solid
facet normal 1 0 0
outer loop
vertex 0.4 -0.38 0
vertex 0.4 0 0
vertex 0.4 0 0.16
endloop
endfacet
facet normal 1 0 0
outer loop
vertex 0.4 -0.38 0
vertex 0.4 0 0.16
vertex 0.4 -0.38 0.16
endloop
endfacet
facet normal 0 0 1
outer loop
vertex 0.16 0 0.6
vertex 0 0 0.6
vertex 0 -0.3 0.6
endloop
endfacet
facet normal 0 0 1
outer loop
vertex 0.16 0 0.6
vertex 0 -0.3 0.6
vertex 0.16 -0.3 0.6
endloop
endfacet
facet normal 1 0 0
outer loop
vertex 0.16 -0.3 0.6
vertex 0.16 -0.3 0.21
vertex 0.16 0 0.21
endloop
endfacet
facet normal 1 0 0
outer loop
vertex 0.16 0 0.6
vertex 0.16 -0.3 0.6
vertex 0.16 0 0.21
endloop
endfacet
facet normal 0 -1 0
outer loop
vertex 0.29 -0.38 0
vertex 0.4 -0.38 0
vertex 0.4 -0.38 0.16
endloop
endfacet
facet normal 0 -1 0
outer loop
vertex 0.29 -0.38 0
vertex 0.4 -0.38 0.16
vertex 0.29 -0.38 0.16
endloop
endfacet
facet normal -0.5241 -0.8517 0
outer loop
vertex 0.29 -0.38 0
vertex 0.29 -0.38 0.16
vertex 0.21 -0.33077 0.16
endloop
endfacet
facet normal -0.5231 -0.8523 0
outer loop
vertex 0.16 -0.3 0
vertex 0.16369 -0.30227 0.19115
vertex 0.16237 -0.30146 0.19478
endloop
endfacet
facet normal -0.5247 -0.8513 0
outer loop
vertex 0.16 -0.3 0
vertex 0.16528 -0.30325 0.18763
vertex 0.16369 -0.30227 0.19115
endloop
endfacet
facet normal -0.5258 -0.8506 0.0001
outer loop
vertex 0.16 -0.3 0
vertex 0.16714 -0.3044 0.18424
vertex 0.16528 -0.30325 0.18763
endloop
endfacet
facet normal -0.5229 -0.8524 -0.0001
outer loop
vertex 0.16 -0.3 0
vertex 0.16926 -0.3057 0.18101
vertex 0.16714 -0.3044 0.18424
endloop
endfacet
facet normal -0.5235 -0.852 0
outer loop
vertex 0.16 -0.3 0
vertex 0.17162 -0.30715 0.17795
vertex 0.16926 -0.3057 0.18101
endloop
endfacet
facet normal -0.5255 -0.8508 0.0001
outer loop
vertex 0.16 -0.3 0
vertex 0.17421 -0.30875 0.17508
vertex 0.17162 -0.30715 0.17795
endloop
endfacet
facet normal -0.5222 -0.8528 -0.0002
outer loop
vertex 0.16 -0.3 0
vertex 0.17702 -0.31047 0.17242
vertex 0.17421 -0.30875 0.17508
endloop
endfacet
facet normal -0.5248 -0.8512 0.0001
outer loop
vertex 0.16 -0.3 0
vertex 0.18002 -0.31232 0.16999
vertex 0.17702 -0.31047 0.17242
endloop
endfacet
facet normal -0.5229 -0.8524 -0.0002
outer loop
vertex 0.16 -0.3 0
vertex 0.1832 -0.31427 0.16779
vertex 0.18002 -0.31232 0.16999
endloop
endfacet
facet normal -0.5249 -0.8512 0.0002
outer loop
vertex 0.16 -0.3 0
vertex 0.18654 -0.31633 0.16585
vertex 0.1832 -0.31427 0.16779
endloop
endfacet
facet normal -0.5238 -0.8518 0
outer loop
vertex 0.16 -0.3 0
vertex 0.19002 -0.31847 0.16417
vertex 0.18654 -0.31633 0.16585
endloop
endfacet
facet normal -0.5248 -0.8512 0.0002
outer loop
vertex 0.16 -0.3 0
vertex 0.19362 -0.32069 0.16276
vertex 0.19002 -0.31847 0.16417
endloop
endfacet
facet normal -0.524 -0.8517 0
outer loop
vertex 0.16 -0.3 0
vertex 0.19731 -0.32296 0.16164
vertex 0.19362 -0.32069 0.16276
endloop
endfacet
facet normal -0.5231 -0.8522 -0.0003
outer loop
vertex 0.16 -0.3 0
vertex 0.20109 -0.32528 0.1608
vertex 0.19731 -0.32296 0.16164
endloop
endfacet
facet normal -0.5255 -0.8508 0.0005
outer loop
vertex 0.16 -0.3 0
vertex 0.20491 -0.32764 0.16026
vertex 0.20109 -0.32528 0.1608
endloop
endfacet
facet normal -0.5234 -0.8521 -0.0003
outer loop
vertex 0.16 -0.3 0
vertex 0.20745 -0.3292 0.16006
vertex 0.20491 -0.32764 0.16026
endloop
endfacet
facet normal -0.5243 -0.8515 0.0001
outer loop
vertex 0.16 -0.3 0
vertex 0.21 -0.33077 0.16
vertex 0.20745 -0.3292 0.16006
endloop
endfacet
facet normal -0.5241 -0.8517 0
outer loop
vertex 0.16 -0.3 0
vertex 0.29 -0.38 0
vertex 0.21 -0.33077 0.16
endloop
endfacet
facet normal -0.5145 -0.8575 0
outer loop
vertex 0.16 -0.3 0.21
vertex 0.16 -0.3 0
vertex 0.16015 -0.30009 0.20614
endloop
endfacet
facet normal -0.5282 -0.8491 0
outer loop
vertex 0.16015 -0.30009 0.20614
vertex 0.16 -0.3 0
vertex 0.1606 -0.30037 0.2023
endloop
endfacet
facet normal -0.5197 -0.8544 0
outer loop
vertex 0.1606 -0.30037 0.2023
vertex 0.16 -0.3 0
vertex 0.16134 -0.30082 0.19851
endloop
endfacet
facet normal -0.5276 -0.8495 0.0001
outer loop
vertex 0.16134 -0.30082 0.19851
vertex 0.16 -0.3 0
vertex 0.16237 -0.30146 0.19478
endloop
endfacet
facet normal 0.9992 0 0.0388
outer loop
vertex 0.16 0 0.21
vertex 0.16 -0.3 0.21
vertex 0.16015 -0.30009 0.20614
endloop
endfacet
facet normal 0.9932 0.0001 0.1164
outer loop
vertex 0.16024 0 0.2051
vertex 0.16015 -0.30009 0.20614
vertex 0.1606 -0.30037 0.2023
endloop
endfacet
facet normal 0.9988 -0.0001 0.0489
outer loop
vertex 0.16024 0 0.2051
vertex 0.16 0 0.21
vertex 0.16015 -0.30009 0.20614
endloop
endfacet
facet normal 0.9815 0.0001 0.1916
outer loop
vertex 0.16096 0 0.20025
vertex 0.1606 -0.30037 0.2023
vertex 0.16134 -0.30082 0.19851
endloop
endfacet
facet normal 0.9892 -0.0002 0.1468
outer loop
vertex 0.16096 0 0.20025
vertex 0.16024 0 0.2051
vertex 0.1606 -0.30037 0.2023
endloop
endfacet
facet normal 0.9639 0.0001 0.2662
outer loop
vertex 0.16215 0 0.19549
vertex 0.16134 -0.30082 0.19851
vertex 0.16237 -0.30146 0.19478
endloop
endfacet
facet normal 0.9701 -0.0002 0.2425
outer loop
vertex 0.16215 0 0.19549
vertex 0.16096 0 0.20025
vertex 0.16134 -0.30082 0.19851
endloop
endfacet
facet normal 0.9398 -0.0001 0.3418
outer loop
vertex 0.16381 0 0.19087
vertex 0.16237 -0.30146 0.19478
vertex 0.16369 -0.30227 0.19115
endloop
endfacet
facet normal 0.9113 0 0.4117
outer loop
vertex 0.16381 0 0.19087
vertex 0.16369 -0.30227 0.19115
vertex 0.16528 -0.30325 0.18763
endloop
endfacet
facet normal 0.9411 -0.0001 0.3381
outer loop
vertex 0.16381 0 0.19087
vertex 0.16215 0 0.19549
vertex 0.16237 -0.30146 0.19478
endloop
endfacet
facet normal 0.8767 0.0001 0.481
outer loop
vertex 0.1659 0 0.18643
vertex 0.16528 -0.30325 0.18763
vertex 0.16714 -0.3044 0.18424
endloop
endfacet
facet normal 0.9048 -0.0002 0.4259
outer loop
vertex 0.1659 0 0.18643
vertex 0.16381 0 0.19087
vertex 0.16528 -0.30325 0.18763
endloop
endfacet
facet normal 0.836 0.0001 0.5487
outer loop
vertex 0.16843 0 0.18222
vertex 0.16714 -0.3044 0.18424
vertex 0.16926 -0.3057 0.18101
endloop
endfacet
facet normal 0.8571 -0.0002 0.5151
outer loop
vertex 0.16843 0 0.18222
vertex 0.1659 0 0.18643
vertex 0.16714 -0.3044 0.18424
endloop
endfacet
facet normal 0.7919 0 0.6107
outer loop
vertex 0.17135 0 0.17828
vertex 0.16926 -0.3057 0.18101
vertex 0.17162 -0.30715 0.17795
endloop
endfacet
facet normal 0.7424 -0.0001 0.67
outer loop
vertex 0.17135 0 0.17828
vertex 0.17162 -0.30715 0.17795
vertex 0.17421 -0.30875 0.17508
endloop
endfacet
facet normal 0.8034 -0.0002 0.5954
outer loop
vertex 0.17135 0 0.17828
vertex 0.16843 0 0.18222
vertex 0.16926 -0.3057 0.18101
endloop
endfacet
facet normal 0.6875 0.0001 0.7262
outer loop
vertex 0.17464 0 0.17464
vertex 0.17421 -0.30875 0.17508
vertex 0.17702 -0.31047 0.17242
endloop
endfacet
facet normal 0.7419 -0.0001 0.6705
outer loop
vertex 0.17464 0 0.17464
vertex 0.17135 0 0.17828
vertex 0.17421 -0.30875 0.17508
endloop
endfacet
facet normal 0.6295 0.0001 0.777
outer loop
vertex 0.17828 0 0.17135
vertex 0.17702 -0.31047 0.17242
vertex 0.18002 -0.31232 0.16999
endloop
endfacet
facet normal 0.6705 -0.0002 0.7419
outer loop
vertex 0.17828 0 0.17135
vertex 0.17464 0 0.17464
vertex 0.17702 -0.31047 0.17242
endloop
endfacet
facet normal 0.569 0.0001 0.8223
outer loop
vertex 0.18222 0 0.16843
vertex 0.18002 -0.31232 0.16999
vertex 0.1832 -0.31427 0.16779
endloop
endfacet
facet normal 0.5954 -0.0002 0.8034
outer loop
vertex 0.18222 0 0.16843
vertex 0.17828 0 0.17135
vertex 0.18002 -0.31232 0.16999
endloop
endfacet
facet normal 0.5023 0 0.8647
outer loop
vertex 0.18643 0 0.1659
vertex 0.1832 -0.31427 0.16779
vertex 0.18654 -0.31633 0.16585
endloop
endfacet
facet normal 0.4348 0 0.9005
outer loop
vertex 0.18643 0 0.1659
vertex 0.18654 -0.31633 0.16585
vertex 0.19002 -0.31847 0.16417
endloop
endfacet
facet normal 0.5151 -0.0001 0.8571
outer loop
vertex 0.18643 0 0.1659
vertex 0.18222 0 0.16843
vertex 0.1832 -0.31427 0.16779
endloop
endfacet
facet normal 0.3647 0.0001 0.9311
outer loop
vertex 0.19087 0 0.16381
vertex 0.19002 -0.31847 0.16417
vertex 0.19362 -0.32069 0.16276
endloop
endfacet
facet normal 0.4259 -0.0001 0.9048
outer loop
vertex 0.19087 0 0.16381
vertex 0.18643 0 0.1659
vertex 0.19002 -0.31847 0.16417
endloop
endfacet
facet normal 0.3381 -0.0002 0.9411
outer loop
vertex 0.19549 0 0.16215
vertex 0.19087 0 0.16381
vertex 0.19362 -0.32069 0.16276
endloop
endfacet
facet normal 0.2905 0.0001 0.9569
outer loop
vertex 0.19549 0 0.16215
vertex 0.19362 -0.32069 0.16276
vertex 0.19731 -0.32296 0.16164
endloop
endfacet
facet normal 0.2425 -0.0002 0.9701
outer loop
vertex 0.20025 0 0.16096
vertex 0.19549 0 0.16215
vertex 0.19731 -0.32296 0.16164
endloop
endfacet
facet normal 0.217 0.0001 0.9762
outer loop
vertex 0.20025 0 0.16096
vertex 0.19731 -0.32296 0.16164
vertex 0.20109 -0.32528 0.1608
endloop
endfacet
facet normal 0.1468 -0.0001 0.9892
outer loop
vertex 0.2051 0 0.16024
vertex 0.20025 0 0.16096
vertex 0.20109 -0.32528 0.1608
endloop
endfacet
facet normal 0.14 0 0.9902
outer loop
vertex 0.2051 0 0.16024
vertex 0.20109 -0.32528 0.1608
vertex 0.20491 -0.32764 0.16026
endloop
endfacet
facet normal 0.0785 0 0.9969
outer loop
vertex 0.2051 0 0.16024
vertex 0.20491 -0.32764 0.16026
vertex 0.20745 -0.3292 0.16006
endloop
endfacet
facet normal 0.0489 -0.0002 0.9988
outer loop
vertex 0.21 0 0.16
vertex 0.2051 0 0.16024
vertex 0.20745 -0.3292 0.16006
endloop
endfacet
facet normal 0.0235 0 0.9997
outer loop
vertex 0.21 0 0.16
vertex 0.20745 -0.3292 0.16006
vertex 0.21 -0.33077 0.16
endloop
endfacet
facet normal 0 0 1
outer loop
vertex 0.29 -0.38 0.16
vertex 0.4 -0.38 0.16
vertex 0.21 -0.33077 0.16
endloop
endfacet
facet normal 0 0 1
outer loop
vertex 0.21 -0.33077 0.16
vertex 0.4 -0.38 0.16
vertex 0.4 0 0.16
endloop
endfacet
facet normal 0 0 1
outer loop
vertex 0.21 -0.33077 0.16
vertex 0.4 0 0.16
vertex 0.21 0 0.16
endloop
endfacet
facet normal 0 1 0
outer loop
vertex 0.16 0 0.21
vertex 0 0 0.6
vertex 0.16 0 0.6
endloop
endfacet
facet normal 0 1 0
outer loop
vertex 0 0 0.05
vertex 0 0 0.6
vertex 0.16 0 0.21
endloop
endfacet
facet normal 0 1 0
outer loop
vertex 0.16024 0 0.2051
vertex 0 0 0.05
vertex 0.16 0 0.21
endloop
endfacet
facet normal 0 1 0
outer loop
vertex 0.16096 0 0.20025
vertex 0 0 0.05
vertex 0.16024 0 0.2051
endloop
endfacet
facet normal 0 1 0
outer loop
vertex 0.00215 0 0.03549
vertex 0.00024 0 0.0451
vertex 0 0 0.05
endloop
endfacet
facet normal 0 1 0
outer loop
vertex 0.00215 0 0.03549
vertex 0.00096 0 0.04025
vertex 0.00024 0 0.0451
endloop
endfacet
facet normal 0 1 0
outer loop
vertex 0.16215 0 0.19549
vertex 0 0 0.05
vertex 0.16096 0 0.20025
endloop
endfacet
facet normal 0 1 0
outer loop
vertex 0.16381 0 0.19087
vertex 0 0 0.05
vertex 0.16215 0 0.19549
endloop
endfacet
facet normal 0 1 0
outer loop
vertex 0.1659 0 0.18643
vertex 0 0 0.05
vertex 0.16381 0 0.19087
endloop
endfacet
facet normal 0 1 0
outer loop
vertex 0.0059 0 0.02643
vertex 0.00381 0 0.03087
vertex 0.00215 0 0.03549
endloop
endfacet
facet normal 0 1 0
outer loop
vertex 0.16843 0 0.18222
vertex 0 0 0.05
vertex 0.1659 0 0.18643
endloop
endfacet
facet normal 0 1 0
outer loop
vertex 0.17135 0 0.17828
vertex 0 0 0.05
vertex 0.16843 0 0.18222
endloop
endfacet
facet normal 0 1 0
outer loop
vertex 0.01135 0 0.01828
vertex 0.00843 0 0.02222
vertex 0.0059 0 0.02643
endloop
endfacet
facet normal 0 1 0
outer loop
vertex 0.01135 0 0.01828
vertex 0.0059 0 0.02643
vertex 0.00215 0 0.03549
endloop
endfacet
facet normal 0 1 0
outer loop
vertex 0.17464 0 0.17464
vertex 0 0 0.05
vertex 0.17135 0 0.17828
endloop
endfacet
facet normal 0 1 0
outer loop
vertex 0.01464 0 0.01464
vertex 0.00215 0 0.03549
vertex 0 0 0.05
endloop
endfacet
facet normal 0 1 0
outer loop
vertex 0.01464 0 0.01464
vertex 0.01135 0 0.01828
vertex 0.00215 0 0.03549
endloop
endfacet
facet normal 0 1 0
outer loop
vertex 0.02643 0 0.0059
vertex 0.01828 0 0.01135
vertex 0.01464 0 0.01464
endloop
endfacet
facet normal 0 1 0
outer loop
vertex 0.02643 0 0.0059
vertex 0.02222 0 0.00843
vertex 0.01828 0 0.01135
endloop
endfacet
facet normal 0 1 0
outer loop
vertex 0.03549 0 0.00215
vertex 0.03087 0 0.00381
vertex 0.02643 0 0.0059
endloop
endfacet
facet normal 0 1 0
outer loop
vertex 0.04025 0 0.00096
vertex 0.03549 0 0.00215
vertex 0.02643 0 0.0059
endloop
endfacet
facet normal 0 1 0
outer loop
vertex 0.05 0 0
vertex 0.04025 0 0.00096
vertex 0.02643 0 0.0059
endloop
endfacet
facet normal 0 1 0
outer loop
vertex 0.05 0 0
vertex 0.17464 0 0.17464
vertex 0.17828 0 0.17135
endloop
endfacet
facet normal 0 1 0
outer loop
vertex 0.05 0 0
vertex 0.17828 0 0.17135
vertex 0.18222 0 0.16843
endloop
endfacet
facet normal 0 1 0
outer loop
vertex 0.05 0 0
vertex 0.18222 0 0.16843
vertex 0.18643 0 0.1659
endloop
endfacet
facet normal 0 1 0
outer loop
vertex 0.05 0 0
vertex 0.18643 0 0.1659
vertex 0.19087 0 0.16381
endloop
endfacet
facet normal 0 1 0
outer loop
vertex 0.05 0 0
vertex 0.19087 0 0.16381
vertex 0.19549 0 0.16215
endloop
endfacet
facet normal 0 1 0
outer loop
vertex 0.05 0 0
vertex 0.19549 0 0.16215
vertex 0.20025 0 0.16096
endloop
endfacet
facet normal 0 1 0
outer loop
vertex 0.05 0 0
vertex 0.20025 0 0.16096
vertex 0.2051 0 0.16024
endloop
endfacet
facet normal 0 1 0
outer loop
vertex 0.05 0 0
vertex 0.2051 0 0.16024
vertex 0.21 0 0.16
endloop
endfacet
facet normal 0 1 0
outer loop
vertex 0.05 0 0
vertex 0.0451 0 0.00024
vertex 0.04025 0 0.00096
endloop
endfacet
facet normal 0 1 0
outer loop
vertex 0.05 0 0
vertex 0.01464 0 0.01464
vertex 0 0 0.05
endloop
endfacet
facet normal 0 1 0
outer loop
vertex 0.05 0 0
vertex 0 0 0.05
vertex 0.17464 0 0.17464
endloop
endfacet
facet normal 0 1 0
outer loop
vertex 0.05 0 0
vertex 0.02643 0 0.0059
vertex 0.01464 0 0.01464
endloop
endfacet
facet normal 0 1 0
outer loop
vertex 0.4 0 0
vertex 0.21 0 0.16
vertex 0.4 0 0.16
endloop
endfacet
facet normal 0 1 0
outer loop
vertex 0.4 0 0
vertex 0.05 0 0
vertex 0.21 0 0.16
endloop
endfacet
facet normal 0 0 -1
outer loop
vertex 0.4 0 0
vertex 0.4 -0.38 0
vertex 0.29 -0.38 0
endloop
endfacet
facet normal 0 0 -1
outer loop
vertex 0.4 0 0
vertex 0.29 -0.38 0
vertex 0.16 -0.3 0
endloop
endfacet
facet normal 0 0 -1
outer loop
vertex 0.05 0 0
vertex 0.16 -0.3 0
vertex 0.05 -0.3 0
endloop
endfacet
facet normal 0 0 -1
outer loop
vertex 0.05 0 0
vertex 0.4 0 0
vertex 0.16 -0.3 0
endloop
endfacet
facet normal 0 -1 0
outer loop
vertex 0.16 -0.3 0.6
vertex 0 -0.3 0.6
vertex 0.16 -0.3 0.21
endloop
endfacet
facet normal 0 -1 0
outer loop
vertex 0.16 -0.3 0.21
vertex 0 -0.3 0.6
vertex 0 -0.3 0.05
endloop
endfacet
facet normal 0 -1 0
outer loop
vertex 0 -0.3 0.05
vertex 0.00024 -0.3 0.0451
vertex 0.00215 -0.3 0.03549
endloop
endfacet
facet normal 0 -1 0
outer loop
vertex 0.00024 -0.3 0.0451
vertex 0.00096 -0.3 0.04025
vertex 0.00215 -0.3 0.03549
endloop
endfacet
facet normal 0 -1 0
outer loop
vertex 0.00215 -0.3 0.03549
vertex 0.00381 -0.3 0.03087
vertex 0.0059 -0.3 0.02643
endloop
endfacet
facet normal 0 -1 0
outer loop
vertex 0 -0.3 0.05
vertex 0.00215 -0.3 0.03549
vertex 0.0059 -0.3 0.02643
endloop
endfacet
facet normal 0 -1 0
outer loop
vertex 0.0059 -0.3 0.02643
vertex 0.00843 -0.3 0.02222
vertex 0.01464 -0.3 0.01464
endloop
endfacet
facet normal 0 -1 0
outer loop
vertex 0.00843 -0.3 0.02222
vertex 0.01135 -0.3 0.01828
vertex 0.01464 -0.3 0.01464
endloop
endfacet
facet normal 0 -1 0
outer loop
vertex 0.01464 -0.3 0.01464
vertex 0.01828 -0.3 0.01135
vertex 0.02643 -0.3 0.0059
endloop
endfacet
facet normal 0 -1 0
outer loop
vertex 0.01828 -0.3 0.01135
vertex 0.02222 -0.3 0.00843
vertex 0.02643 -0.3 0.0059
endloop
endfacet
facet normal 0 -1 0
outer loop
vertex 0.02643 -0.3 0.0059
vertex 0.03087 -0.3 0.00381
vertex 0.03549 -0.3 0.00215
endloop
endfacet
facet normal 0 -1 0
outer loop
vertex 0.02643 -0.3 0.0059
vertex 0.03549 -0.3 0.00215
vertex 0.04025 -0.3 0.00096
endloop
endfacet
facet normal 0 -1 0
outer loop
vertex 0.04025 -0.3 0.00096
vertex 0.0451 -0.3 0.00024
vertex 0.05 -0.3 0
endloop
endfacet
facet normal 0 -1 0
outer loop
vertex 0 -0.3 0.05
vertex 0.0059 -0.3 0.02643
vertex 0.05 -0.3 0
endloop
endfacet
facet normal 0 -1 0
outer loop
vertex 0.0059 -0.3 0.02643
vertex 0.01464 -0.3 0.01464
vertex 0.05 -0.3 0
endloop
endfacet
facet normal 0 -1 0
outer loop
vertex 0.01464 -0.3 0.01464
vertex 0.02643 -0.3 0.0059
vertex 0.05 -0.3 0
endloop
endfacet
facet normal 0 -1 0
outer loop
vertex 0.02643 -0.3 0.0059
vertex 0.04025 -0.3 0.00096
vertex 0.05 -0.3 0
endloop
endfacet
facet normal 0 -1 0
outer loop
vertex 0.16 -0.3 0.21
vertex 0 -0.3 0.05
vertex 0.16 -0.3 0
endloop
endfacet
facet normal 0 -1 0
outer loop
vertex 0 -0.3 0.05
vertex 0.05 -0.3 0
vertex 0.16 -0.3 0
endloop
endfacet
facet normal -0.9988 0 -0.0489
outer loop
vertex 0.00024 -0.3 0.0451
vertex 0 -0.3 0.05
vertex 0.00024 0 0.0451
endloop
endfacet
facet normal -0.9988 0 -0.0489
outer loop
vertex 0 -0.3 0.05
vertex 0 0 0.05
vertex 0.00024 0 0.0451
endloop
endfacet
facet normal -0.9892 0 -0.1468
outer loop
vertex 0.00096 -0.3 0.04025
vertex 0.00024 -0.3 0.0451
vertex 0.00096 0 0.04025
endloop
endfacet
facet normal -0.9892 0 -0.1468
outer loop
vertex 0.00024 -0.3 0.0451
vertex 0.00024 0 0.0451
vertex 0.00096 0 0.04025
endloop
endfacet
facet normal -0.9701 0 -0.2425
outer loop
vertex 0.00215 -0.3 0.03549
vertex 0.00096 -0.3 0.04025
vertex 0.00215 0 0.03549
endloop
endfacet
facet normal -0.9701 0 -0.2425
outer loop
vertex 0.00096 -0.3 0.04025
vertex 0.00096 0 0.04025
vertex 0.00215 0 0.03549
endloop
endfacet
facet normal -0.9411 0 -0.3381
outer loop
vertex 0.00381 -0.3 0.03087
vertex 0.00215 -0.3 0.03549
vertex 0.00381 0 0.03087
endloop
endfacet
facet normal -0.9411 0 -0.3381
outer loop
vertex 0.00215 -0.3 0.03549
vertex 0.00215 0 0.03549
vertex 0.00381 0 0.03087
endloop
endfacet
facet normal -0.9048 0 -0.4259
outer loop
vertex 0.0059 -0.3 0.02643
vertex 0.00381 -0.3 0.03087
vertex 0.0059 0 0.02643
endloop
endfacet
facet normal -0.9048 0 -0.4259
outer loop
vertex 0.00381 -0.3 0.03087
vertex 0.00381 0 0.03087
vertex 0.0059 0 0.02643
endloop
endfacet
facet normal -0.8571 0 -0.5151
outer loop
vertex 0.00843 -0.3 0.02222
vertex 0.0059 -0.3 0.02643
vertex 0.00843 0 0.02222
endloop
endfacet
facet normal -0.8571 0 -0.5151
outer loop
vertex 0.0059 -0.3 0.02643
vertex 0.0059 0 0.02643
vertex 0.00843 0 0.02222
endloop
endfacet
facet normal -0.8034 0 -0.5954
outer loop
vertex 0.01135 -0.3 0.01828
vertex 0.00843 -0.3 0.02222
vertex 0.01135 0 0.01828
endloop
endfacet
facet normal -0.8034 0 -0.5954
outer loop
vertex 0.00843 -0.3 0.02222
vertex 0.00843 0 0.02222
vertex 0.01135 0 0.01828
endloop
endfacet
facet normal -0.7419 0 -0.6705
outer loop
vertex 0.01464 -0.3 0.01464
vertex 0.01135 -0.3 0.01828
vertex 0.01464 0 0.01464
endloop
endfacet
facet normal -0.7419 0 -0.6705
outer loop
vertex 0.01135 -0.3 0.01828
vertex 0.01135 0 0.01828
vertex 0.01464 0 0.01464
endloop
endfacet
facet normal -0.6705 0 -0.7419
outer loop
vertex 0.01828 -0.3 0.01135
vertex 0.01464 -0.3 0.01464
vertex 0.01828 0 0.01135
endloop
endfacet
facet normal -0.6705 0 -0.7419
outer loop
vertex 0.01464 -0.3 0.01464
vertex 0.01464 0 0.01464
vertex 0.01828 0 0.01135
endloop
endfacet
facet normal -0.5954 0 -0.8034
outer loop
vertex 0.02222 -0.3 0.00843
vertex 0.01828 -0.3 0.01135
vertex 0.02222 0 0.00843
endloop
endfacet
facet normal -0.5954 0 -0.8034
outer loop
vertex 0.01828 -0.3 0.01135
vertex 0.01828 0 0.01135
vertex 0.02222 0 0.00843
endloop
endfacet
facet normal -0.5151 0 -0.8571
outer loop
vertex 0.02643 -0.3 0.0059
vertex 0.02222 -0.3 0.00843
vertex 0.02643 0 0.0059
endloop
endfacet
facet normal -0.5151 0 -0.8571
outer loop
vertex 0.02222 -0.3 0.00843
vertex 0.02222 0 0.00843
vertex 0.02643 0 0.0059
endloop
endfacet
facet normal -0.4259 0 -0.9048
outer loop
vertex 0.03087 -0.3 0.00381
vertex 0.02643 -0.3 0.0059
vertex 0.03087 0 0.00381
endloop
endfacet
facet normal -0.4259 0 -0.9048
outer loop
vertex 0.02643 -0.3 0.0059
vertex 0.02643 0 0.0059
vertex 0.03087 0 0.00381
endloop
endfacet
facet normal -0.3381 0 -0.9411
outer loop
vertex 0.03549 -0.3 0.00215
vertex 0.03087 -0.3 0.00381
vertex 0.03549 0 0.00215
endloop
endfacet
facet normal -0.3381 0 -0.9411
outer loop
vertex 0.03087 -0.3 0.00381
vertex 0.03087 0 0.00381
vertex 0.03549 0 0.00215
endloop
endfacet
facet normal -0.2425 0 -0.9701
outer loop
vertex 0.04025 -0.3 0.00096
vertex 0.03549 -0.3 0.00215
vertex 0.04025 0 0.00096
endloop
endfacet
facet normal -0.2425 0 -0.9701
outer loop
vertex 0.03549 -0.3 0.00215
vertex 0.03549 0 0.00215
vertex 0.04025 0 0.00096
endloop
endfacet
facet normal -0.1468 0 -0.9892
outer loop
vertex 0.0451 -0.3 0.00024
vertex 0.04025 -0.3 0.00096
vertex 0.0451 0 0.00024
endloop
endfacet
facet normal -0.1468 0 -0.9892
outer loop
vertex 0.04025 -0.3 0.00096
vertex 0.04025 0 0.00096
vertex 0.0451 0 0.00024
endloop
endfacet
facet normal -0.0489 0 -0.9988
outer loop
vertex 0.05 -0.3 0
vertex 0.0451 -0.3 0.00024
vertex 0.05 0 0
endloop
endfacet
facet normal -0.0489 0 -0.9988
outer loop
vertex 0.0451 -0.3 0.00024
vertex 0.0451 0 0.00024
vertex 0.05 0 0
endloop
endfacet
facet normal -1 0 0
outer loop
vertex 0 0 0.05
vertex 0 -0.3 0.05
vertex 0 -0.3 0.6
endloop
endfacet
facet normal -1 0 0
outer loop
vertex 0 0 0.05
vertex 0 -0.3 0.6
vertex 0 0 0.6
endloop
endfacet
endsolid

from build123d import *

# Parameters (mm, degrees)
EXTRUDE_1_DEPTH = 0.16
SKETCH_2_W      = 0.16
SKETCH_2_H      = 0.3
EXTRUDE_2_DEPTH = 0.44
FILLET_1_R      = 0.05
FILLET_2_R      = 0.05


with BuildPart() as part:
    # 草图1 → 凸台-拉伸1 (new body)
    with BuildSketch(Plane.XY):
        Polygon((0, 0), (0.4, 0), (0.4, -0.38), (0.29, -0.38), (0.16, -0.3), (0, -0.3), align=None)
    extrude(amount=EXTRUDE_1_DEPTH)

    # 草图2 → 凸台-拉伸2 (add)
    with BuildSketch(Plane.XY.offset(0.16)):
        with Locations((0.08, -0.15)):
            Rectangle(SKETCH_2_W, SKETCH_2_H)
    extrude(amount=EXTRUDE_2_DEPTH)

    # 圆角1
    fillet_1_edges = [part.edges().sort_by_distance(p)[0] for p in [
        (0, -0.15, 0),
    ]]
    fillet(fillet_1_edges, radius=FILLET_1_R)

    # 圆角2
    fillet_2_edges = [part.edges().sort_by_distance(p)[0] for p in [
        (0.16, -0.15, 0.16),
    ]]
    fillet(fillet_2_edges, radius=FILLET_2_R)


solid = part.part
